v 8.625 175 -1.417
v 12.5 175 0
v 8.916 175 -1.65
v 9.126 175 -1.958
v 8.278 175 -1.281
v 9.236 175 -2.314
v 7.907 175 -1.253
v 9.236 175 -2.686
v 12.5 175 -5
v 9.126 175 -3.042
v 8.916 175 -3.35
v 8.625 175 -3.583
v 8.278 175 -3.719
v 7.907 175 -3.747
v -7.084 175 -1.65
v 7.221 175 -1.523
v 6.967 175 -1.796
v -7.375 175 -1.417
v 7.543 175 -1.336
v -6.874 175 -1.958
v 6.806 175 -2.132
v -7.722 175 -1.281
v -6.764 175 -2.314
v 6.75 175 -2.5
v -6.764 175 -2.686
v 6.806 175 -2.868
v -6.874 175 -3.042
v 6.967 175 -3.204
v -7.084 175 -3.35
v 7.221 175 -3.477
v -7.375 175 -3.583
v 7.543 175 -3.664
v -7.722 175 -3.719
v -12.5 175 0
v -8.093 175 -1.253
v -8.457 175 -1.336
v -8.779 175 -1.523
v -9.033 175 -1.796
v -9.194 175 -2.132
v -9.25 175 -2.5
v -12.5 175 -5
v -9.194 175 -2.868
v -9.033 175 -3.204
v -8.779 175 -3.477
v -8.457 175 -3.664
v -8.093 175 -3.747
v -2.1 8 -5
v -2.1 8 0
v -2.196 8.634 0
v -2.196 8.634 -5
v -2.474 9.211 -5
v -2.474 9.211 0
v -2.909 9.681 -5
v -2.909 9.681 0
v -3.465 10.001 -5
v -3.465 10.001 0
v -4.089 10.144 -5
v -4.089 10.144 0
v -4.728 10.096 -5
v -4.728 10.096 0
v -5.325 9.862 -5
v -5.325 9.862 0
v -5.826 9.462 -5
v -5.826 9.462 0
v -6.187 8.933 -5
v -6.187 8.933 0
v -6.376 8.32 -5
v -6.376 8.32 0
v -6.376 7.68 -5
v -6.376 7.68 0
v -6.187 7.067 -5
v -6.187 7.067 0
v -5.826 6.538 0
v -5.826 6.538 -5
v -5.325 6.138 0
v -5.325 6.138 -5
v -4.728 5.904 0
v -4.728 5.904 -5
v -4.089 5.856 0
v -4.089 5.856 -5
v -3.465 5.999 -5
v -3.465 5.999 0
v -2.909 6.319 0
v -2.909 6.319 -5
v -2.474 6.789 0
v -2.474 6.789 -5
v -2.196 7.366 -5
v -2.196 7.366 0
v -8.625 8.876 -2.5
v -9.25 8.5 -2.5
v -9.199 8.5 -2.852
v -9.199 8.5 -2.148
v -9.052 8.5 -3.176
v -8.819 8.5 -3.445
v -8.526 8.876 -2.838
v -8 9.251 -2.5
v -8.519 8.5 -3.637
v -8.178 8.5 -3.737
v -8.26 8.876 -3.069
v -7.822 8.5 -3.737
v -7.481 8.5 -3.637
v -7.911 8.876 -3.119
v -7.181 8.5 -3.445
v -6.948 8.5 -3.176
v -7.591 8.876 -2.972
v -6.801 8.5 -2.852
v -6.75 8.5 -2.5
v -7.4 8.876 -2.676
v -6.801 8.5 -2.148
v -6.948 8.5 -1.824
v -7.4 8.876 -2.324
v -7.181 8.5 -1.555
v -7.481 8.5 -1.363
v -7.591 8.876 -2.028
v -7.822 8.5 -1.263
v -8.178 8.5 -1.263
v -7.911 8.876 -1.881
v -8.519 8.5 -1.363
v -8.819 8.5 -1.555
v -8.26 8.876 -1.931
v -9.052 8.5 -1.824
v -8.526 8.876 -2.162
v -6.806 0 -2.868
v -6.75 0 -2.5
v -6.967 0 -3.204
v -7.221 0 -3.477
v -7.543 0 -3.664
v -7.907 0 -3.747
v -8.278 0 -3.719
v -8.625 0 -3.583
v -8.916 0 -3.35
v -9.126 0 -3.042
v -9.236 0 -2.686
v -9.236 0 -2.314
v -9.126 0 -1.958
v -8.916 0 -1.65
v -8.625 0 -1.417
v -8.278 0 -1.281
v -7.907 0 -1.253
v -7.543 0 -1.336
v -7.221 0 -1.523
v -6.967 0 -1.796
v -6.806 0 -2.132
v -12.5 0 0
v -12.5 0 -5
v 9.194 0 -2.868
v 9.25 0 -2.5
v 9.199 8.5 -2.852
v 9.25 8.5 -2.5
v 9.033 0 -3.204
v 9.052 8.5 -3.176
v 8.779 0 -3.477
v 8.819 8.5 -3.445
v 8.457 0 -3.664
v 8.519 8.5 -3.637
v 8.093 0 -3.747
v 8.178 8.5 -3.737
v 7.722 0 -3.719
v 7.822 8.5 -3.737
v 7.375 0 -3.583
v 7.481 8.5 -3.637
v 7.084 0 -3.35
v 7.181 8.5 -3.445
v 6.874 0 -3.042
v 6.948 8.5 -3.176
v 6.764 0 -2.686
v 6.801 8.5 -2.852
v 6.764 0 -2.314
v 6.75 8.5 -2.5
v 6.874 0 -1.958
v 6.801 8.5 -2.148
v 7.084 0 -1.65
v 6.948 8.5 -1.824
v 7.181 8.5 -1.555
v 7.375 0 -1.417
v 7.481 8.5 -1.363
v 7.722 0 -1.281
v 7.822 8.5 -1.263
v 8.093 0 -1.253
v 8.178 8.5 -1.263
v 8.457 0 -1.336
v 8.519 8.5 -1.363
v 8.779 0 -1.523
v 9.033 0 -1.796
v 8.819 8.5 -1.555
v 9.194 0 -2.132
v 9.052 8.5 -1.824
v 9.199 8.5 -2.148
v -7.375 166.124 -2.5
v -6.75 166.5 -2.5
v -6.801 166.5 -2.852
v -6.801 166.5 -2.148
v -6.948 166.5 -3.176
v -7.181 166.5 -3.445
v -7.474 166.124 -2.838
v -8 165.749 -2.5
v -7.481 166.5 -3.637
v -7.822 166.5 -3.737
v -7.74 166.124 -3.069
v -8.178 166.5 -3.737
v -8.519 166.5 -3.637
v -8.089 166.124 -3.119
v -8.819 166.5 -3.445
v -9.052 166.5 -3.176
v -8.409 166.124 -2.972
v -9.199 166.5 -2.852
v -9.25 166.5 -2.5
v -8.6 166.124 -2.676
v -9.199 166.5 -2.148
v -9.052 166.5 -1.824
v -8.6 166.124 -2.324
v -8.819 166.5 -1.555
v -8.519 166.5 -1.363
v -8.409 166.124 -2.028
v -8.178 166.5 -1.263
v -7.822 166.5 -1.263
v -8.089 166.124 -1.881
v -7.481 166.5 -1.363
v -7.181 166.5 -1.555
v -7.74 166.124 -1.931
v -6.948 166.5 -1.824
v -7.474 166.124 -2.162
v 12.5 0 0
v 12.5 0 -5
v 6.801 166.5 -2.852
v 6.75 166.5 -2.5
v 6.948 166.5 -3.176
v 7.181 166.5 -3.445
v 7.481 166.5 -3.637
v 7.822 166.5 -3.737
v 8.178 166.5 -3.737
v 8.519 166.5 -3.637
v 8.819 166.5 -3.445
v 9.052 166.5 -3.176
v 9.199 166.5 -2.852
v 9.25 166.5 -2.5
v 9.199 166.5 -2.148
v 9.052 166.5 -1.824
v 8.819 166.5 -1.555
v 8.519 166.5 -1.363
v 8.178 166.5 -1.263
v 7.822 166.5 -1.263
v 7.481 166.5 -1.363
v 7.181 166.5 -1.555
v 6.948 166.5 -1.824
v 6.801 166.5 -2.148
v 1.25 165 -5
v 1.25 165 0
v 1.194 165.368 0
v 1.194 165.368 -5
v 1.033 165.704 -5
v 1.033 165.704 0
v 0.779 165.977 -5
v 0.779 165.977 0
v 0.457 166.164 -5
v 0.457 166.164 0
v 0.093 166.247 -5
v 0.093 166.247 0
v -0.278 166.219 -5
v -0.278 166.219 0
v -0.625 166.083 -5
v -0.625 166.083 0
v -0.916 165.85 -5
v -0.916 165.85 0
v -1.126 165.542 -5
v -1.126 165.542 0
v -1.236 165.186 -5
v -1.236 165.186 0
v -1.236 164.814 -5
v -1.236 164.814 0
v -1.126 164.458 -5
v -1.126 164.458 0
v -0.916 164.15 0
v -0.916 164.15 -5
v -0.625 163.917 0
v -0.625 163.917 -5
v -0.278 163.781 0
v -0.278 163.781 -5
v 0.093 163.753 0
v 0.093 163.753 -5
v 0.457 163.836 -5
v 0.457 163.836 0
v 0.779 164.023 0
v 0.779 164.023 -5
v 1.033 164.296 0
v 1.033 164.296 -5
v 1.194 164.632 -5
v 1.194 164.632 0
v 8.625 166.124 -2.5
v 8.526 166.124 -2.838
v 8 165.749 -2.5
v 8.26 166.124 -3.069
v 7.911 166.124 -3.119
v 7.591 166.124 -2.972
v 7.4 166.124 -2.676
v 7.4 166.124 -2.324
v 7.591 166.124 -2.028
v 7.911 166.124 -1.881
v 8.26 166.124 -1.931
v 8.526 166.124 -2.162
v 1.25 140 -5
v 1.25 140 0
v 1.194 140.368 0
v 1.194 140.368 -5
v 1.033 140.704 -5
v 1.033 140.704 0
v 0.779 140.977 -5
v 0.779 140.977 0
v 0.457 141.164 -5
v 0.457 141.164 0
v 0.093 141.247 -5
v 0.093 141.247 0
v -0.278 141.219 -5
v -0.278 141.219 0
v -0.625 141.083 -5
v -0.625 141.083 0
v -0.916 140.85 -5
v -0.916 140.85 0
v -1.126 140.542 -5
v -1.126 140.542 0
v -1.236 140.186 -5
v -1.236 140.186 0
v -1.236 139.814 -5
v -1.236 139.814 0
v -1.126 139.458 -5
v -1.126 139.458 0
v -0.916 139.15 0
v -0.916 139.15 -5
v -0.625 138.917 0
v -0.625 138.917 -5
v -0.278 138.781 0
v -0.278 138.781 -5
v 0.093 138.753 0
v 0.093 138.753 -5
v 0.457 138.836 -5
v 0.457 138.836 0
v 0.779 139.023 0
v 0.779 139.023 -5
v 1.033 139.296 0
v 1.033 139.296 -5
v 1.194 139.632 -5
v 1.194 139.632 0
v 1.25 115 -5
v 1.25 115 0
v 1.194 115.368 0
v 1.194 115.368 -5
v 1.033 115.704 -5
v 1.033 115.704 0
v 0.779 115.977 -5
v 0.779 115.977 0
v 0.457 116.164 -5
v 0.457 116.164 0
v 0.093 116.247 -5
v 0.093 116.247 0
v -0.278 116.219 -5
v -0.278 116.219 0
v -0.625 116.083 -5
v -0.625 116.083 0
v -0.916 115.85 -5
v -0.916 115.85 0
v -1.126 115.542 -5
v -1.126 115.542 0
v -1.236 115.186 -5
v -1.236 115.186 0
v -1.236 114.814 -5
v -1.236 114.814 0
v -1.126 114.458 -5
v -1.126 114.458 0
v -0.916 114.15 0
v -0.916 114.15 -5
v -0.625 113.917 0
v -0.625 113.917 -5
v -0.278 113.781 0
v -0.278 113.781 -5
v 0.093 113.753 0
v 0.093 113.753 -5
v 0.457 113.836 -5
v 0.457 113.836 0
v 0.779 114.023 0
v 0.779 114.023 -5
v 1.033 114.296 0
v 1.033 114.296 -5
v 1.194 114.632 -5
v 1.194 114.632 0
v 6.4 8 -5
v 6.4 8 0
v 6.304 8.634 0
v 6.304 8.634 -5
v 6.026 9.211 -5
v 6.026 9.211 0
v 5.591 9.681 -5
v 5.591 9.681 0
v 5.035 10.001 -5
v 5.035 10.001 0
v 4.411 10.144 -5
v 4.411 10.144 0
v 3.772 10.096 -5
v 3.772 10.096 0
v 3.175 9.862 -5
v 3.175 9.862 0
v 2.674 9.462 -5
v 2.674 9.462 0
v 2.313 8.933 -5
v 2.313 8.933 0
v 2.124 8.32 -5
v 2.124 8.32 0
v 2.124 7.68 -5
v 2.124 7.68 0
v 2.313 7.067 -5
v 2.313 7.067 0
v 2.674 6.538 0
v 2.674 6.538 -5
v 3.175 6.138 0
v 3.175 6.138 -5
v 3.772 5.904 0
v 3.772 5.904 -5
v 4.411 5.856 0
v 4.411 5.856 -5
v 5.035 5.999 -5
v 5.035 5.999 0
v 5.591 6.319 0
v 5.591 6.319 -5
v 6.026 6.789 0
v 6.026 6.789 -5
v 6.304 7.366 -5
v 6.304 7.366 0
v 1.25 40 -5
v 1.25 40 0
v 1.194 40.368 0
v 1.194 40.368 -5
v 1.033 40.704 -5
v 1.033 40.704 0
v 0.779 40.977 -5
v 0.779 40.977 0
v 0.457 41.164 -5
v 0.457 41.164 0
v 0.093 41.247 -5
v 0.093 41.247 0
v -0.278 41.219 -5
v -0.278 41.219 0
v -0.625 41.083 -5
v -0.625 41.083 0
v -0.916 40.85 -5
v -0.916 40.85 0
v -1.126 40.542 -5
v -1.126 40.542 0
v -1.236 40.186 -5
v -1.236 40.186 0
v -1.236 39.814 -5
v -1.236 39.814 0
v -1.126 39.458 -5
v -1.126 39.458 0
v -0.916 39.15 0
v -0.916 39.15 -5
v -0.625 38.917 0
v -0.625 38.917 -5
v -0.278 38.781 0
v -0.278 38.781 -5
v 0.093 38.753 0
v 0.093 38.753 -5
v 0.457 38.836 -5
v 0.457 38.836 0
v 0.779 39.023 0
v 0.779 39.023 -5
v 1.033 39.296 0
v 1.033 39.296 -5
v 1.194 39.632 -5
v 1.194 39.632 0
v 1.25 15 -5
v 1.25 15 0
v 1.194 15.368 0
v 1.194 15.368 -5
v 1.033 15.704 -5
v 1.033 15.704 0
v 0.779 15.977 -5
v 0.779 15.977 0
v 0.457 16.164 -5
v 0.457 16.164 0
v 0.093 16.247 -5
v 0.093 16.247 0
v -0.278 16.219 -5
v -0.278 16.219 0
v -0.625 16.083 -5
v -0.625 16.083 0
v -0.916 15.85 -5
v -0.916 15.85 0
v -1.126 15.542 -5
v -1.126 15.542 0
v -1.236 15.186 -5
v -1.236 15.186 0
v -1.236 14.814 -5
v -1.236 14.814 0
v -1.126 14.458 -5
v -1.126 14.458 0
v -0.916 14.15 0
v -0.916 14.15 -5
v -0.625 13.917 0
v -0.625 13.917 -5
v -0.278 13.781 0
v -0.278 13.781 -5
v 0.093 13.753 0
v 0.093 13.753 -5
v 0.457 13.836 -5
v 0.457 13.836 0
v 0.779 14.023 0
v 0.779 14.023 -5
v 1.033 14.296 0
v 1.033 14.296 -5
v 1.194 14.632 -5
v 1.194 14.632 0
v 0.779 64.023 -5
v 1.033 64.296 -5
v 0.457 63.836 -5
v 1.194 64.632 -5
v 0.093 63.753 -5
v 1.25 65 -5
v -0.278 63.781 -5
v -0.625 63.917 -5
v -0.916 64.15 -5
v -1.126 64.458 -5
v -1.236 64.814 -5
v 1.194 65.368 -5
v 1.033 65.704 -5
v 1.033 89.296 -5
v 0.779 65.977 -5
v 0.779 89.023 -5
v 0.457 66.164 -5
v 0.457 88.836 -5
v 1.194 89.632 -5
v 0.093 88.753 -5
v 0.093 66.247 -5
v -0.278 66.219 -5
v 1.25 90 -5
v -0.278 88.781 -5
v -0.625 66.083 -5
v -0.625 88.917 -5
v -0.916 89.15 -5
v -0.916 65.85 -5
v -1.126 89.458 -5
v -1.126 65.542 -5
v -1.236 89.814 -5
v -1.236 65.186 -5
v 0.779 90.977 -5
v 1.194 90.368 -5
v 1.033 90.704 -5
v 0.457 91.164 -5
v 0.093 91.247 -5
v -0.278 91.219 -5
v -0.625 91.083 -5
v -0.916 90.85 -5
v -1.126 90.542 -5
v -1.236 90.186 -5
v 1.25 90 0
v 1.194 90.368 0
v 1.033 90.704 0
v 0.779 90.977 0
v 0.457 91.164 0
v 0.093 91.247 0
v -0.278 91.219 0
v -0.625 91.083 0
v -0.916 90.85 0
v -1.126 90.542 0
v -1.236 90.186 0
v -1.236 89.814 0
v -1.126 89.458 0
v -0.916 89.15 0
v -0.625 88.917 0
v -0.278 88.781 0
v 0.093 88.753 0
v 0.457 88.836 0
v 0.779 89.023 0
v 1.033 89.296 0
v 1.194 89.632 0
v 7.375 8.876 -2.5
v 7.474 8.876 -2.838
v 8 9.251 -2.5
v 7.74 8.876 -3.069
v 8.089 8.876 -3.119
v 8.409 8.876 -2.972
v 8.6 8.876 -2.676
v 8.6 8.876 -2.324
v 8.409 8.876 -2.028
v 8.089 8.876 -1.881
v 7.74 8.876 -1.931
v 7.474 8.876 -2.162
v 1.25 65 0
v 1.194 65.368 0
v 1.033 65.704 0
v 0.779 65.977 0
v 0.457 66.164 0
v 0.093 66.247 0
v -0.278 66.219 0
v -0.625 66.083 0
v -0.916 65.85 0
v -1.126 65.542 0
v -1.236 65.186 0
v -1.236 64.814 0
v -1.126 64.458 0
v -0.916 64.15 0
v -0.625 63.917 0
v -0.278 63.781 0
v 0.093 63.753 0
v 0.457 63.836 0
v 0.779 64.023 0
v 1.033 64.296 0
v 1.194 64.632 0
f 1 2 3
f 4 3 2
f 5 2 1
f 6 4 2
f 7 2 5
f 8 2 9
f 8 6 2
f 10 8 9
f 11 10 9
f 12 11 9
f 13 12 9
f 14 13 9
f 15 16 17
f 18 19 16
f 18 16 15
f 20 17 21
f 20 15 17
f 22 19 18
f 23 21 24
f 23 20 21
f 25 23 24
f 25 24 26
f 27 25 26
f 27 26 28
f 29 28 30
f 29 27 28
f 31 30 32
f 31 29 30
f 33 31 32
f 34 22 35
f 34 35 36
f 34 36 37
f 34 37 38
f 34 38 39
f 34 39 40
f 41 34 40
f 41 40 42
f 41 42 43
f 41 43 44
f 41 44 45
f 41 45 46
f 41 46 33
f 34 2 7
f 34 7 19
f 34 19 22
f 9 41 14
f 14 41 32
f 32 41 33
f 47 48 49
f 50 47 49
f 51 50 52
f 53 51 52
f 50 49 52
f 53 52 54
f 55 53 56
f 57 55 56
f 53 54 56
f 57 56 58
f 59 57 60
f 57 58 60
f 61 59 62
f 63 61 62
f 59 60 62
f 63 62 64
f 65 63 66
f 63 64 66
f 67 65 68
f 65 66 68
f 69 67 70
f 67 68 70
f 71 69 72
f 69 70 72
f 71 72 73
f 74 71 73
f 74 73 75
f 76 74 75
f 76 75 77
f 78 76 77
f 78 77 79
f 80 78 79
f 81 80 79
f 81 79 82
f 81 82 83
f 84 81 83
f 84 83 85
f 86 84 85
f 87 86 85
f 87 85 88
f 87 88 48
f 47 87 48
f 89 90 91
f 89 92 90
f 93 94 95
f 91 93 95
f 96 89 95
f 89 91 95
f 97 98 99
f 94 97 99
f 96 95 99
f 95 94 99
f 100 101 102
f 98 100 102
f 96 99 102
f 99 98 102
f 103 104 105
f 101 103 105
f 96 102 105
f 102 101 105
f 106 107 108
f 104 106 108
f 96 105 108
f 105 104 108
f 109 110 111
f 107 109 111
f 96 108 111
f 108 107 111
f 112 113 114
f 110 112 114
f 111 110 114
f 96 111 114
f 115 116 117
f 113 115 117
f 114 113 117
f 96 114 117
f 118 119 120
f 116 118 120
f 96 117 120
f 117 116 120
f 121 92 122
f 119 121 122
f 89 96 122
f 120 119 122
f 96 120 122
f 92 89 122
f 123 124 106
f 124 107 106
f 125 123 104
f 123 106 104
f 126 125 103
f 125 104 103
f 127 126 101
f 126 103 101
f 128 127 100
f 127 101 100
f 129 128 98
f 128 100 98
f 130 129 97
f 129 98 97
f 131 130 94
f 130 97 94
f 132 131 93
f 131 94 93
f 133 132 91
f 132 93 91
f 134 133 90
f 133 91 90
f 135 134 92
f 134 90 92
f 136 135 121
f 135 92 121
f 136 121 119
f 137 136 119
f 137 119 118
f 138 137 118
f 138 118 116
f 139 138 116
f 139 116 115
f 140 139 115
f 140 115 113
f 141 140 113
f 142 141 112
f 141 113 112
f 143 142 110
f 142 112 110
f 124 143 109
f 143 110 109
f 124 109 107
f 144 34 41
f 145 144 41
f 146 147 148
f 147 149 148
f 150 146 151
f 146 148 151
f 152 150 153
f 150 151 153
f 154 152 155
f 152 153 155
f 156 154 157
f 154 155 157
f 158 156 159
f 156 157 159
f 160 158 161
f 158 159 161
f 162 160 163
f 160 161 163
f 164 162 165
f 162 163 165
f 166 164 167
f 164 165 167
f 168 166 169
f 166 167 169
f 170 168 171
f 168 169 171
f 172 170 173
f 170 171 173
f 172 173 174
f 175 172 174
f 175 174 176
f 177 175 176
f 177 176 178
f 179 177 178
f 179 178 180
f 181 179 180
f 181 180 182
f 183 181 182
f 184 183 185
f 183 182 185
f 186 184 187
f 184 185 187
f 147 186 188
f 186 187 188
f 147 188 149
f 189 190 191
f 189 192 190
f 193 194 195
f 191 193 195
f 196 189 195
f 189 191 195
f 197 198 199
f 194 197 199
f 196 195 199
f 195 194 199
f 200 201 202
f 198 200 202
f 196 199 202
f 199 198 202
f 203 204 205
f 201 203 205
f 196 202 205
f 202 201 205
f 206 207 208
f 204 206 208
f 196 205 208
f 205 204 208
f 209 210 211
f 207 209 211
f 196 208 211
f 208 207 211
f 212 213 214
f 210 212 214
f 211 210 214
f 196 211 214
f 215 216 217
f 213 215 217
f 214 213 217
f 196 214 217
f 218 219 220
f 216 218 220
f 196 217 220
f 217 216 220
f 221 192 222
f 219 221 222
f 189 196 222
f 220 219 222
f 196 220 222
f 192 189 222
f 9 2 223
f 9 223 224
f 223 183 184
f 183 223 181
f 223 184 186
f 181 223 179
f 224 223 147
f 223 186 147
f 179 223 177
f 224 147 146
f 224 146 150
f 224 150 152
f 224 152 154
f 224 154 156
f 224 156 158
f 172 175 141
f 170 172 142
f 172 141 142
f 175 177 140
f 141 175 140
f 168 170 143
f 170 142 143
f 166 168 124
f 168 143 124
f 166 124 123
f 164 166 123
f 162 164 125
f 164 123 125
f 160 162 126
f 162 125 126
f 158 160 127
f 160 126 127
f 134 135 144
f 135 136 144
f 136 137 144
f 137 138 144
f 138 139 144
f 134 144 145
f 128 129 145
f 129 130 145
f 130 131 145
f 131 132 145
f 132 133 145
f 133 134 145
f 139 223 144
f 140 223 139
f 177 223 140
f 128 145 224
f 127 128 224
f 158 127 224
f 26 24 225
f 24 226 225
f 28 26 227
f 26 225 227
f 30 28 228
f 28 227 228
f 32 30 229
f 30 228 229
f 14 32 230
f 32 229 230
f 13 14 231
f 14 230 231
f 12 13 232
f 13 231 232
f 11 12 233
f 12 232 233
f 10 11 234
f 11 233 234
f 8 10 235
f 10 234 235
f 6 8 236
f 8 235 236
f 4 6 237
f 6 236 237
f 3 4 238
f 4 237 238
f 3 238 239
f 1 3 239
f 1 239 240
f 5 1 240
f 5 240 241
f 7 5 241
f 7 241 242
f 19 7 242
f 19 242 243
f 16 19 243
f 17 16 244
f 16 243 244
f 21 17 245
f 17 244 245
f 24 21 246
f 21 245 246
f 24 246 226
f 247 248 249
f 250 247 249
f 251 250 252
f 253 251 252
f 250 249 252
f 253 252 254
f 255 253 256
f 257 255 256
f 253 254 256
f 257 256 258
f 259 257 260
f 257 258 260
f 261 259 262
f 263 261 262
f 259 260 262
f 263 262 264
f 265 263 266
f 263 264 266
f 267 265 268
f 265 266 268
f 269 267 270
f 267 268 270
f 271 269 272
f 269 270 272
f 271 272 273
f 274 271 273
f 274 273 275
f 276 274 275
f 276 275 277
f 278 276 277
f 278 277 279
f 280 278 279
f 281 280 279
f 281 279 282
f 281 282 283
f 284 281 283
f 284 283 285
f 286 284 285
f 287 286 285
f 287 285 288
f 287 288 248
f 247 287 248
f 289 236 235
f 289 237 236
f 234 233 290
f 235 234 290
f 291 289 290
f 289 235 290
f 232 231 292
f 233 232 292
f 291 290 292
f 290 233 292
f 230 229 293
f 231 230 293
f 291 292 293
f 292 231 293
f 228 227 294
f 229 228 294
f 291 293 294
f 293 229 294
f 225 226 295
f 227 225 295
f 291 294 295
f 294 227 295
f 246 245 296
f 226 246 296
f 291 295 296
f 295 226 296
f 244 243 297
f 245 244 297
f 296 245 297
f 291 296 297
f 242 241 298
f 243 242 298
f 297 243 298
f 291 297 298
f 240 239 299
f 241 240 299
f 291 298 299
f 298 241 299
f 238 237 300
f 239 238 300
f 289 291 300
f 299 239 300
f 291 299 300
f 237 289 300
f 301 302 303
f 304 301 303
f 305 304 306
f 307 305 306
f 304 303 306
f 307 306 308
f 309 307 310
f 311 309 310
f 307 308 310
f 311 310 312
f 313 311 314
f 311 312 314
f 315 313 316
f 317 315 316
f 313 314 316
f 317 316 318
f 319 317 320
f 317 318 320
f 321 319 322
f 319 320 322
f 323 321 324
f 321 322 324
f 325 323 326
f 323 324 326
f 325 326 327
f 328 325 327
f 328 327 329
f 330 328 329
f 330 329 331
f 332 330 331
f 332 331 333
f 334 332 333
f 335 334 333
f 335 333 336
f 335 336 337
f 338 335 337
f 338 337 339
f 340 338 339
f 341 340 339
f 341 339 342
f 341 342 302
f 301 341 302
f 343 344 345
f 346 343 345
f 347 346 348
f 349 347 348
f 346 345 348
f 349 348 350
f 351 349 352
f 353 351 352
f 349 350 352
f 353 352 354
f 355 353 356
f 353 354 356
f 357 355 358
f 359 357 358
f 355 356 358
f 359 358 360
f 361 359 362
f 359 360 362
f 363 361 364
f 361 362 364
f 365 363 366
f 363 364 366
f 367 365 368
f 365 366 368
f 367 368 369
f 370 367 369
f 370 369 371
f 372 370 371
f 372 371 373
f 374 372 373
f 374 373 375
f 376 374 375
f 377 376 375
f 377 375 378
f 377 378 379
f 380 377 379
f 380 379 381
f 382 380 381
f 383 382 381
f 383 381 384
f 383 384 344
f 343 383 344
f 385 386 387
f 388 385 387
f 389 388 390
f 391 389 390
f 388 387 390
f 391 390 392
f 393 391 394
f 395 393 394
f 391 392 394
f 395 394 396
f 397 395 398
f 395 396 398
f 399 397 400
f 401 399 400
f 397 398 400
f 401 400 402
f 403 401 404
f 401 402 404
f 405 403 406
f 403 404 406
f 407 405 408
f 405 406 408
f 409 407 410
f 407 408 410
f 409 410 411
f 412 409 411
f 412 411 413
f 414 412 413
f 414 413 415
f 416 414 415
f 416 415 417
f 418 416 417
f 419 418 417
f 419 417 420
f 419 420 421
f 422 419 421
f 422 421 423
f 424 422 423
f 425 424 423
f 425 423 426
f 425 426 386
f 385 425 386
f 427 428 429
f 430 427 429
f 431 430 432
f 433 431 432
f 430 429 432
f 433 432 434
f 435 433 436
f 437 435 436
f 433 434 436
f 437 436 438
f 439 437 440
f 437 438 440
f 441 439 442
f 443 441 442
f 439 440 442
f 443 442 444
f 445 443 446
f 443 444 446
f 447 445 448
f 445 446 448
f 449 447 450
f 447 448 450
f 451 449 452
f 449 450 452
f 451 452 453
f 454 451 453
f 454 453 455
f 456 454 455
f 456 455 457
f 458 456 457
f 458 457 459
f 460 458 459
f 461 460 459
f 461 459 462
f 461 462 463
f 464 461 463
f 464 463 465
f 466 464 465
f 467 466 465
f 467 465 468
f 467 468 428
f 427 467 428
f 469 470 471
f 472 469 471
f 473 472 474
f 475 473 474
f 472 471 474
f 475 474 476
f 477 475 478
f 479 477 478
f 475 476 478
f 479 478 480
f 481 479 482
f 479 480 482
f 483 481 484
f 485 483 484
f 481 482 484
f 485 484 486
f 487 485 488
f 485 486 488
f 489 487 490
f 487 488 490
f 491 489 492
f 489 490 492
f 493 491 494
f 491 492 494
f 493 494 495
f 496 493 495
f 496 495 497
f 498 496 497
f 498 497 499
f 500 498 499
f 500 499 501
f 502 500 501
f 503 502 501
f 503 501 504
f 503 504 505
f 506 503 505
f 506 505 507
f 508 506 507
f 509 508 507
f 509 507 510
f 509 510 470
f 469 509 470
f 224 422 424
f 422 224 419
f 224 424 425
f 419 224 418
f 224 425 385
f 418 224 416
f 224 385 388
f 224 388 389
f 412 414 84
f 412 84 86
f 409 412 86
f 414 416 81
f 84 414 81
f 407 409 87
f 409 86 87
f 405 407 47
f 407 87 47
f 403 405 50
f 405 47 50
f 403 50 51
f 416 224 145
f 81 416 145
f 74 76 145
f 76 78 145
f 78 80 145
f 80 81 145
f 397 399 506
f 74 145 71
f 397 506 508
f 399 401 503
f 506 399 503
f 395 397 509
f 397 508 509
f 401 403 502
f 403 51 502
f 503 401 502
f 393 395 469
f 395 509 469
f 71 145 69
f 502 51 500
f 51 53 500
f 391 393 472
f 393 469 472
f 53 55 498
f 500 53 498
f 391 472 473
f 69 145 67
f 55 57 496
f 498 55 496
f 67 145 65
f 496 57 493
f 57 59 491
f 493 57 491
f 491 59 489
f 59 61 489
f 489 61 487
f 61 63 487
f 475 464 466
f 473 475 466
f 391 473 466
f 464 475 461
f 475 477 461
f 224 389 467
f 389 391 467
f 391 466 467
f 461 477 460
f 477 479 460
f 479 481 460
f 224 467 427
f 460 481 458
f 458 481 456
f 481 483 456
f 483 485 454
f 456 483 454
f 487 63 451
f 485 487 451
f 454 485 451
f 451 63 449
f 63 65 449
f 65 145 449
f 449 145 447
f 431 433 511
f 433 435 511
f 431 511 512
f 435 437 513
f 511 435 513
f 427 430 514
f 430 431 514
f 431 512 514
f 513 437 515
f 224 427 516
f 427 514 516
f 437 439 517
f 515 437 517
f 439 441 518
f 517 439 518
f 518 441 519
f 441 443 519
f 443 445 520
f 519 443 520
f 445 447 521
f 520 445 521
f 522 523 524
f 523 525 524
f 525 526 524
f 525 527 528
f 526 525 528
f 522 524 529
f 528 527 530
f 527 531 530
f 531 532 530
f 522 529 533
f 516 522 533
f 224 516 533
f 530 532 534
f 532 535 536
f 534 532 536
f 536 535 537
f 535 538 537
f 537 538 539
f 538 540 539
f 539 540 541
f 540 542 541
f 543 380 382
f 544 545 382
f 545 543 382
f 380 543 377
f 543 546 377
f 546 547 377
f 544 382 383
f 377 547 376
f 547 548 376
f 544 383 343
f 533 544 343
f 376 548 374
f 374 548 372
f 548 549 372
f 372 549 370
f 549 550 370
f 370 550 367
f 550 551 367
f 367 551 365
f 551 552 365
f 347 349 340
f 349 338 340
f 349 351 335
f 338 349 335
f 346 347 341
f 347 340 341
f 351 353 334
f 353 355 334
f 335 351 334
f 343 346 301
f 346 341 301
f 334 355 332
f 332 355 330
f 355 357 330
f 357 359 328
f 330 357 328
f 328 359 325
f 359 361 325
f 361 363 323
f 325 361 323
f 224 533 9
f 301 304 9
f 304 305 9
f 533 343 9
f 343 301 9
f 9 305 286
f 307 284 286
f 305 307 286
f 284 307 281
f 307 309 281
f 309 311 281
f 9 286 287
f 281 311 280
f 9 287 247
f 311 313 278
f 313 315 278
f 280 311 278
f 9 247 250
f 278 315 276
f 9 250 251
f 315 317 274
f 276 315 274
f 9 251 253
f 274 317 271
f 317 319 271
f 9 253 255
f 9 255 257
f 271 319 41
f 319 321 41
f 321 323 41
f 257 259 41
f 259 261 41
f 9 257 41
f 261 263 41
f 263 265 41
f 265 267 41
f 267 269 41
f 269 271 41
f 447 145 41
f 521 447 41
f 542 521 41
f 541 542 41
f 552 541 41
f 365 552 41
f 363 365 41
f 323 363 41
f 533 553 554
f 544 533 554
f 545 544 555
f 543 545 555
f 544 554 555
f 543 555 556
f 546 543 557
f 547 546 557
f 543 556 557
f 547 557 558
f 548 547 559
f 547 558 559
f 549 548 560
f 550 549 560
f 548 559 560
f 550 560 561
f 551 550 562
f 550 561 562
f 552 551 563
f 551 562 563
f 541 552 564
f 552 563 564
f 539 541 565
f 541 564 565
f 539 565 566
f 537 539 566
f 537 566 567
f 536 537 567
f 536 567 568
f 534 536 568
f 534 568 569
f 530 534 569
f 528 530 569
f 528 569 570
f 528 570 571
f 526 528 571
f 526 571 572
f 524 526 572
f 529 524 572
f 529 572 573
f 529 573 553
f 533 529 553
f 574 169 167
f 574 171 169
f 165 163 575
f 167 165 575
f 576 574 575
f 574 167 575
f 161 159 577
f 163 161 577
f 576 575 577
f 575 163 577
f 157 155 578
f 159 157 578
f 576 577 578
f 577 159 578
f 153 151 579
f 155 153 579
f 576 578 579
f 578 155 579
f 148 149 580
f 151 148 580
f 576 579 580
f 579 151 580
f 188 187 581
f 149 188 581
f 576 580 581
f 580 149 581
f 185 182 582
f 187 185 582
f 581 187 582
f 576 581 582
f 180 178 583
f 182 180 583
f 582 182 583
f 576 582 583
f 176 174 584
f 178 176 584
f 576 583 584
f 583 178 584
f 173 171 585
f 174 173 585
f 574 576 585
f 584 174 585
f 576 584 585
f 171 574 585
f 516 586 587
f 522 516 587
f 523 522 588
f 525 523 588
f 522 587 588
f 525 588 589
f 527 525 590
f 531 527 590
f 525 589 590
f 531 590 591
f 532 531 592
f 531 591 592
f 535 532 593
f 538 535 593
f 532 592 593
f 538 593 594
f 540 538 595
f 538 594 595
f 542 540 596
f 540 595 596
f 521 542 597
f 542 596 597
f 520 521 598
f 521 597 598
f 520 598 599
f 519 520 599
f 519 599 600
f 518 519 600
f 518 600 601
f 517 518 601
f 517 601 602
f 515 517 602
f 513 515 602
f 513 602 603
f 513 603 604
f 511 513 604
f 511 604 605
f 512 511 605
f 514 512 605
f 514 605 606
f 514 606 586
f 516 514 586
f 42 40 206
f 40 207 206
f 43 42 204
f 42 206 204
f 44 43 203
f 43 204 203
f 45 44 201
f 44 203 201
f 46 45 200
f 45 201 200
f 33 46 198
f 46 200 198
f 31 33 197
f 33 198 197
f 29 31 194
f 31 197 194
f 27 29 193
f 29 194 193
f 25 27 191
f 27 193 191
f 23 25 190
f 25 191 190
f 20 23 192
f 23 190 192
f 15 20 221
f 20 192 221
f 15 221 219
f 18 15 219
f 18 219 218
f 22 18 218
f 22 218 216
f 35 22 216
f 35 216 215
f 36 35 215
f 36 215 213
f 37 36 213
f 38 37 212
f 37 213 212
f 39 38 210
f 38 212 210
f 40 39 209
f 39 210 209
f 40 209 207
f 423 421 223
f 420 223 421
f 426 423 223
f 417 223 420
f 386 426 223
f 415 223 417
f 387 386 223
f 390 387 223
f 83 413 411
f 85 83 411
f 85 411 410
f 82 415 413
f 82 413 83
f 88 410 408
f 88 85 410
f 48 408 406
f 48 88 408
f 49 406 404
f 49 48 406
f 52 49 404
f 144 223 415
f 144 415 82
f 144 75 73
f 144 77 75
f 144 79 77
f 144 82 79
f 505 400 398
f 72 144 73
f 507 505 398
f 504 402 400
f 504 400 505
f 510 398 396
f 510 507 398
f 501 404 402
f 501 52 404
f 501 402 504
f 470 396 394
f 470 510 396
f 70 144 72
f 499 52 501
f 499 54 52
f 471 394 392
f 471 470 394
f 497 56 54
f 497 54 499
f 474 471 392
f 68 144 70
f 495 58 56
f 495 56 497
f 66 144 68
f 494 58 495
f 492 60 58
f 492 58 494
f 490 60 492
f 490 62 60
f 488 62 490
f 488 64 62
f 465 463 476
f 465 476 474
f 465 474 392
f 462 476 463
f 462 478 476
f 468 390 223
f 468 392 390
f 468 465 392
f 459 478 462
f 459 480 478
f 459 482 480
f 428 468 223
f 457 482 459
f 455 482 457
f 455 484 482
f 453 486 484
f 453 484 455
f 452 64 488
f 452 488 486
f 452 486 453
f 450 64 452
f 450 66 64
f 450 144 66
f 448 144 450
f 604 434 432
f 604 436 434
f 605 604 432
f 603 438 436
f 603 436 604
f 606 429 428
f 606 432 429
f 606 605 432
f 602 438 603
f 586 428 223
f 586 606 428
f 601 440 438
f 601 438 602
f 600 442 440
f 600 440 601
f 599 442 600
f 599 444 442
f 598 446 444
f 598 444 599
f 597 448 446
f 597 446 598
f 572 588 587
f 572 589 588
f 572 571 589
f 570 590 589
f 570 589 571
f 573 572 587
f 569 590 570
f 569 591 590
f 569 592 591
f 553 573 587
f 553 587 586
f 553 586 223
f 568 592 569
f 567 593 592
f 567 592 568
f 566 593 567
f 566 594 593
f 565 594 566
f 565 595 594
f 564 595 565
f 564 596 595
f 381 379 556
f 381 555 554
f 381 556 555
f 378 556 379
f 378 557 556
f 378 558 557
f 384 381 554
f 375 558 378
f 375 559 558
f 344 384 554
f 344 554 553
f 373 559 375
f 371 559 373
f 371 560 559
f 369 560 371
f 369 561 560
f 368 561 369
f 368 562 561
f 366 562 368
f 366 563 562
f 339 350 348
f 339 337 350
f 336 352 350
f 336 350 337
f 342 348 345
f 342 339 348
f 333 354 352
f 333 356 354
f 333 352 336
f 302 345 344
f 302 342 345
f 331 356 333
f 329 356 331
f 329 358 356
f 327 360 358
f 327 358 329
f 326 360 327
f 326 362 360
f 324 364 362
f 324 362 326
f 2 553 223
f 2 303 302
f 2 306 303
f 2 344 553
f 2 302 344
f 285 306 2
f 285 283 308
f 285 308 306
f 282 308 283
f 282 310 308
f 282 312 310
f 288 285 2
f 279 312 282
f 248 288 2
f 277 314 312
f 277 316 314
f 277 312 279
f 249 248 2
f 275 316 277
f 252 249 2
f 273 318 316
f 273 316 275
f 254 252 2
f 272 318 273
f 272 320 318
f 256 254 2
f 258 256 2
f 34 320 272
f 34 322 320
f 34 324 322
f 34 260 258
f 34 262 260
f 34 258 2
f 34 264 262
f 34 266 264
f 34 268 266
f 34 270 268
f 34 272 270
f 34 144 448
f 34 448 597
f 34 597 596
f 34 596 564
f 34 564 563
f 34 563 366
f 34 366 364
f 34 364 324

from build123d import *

# Parameters (mm, degrees)
AUFSATZ_LINEAR_AUSTRAGEN1_DEPTH      = 12.5
AUFSATZ_LINEAR_AUSTRAGEN1_DEPTH_BACK = 12.5
SKIZZE1_W                            = 5
SKIZZE1_H                            = 175
M3_GEWINDEBOHRUNG3_D                 = 2.5
M3_GEWINDEBOHRUNG1_D                 = 2.5
M3_GEWINDEBOHRUNG1_DEPTH             = 8.5
M3_GEWINDEBOHRUNG1_TIP               = 0.751075774
M3_GEWINDEBOHRUNG2_D                 = 2.5
M3_GEWINDEBOHRUNG2_DEPTH             = 8.5
M3_GEWINDEBOHRUNG2_TIP               = 0.751075774
DURCHGANGSLOCH_F_R_M41_D             = 4.3


with BuildPart() as part:
    # Skizze1 → Aufsatz-Linear austragen1 (new, two sides: drawn at the far end of the back side and taken through both)
    with BuildSketch(Plane(origin=(0, 0, 0), x_dir=(0, 0, -1), z_dir=(1, 0, 0)).offset(-AUFSATZ_LINEAR_AUSTRAGEN1_DEPTH_BACK)):
        with Locations((2.5, 87.5)):
            Rectangle(SKIZZE1_W, SKIZZE1_H)
    extrude(amount=AUFSATZ_LINEAR_AUSTRAGEN1_DEPTH + AUFSATZ_LINEAR_AUSTRAGEN1_DEPTH_BACK)

    # M3 Gewindebohrung3 (through all)
    with Locations(Plane(origin=(0, 0, -5), x_dir=(-1, 0, 0), z_dir=(0, 0, -1))):
        with Locations((0, 15), (0, 165), (0, 140), (0, 115), (0, 90), (0, 65), (0, 40)):
            Hole(M3_GEWINDEBOHRUNG3_D / 2)

    # M3 Gewindebohrung1
    with Locations(Plane(origin=(0, 175, 0), x_dir=(1, 0, 0), z_dir=(0, 1, 0))):
        with Locations((8, 2.5), (-8, 2.5)):
            Hole(M3_GEWINDEBOHRUNG1_D / 2, depth=M3_GEWINDEBOHRUNG1_DEPTH)
            with Locations((0, 0, -(M3_GEWINDEBOHRUNG1_DEPTH + M3_GEWINDEBOHRUNG1_TIP / 2))):  # 118° drill point
                Cone(0, M3_GEWINDEBOHRUNG1_D / 2, M3_GEWINDEBOHRUNG1_TIP, mode=Mode.SUBTRACT)

    # M3 Gewindebohrung2
    with Locations(Plane(origin=(0, 0, 0), x_dir=(-1, 0, 0), z_dir=(0, -1, 0))):
        with Locations((8, 2.5), (-8, 2.5)):
            Hole(M3_GEWINDEBOHRUNG2_D / 2, depth=M3_GEWINDEBOHRUNG2_DEPTH)
            with Locations((0, 0, -(M3_GEWINDEBOHRUNG2_DEPTH + M3_GEWINDEBOHRUNG2_TIP / 2))):  # 118° drill point
                Cone(0, M3_GEWINDEBOHRUNG2_D / 2, M3_GEWINDEBOHRUNG2_TIP, mode=Mode.SUBTRACT)

    # Durchgangsloch für M41 (through all)
    with Locations(Plane(origin=(0, 0, -5), x_dir=(-1, 0, 0), z_dir=(0, 0, -1))):
        with Locations((-4.25, 8), (4.25, 8)):
            Hole(DURCHGANGSLOCH_F_R_M41_D / 2)


solid = part.part
